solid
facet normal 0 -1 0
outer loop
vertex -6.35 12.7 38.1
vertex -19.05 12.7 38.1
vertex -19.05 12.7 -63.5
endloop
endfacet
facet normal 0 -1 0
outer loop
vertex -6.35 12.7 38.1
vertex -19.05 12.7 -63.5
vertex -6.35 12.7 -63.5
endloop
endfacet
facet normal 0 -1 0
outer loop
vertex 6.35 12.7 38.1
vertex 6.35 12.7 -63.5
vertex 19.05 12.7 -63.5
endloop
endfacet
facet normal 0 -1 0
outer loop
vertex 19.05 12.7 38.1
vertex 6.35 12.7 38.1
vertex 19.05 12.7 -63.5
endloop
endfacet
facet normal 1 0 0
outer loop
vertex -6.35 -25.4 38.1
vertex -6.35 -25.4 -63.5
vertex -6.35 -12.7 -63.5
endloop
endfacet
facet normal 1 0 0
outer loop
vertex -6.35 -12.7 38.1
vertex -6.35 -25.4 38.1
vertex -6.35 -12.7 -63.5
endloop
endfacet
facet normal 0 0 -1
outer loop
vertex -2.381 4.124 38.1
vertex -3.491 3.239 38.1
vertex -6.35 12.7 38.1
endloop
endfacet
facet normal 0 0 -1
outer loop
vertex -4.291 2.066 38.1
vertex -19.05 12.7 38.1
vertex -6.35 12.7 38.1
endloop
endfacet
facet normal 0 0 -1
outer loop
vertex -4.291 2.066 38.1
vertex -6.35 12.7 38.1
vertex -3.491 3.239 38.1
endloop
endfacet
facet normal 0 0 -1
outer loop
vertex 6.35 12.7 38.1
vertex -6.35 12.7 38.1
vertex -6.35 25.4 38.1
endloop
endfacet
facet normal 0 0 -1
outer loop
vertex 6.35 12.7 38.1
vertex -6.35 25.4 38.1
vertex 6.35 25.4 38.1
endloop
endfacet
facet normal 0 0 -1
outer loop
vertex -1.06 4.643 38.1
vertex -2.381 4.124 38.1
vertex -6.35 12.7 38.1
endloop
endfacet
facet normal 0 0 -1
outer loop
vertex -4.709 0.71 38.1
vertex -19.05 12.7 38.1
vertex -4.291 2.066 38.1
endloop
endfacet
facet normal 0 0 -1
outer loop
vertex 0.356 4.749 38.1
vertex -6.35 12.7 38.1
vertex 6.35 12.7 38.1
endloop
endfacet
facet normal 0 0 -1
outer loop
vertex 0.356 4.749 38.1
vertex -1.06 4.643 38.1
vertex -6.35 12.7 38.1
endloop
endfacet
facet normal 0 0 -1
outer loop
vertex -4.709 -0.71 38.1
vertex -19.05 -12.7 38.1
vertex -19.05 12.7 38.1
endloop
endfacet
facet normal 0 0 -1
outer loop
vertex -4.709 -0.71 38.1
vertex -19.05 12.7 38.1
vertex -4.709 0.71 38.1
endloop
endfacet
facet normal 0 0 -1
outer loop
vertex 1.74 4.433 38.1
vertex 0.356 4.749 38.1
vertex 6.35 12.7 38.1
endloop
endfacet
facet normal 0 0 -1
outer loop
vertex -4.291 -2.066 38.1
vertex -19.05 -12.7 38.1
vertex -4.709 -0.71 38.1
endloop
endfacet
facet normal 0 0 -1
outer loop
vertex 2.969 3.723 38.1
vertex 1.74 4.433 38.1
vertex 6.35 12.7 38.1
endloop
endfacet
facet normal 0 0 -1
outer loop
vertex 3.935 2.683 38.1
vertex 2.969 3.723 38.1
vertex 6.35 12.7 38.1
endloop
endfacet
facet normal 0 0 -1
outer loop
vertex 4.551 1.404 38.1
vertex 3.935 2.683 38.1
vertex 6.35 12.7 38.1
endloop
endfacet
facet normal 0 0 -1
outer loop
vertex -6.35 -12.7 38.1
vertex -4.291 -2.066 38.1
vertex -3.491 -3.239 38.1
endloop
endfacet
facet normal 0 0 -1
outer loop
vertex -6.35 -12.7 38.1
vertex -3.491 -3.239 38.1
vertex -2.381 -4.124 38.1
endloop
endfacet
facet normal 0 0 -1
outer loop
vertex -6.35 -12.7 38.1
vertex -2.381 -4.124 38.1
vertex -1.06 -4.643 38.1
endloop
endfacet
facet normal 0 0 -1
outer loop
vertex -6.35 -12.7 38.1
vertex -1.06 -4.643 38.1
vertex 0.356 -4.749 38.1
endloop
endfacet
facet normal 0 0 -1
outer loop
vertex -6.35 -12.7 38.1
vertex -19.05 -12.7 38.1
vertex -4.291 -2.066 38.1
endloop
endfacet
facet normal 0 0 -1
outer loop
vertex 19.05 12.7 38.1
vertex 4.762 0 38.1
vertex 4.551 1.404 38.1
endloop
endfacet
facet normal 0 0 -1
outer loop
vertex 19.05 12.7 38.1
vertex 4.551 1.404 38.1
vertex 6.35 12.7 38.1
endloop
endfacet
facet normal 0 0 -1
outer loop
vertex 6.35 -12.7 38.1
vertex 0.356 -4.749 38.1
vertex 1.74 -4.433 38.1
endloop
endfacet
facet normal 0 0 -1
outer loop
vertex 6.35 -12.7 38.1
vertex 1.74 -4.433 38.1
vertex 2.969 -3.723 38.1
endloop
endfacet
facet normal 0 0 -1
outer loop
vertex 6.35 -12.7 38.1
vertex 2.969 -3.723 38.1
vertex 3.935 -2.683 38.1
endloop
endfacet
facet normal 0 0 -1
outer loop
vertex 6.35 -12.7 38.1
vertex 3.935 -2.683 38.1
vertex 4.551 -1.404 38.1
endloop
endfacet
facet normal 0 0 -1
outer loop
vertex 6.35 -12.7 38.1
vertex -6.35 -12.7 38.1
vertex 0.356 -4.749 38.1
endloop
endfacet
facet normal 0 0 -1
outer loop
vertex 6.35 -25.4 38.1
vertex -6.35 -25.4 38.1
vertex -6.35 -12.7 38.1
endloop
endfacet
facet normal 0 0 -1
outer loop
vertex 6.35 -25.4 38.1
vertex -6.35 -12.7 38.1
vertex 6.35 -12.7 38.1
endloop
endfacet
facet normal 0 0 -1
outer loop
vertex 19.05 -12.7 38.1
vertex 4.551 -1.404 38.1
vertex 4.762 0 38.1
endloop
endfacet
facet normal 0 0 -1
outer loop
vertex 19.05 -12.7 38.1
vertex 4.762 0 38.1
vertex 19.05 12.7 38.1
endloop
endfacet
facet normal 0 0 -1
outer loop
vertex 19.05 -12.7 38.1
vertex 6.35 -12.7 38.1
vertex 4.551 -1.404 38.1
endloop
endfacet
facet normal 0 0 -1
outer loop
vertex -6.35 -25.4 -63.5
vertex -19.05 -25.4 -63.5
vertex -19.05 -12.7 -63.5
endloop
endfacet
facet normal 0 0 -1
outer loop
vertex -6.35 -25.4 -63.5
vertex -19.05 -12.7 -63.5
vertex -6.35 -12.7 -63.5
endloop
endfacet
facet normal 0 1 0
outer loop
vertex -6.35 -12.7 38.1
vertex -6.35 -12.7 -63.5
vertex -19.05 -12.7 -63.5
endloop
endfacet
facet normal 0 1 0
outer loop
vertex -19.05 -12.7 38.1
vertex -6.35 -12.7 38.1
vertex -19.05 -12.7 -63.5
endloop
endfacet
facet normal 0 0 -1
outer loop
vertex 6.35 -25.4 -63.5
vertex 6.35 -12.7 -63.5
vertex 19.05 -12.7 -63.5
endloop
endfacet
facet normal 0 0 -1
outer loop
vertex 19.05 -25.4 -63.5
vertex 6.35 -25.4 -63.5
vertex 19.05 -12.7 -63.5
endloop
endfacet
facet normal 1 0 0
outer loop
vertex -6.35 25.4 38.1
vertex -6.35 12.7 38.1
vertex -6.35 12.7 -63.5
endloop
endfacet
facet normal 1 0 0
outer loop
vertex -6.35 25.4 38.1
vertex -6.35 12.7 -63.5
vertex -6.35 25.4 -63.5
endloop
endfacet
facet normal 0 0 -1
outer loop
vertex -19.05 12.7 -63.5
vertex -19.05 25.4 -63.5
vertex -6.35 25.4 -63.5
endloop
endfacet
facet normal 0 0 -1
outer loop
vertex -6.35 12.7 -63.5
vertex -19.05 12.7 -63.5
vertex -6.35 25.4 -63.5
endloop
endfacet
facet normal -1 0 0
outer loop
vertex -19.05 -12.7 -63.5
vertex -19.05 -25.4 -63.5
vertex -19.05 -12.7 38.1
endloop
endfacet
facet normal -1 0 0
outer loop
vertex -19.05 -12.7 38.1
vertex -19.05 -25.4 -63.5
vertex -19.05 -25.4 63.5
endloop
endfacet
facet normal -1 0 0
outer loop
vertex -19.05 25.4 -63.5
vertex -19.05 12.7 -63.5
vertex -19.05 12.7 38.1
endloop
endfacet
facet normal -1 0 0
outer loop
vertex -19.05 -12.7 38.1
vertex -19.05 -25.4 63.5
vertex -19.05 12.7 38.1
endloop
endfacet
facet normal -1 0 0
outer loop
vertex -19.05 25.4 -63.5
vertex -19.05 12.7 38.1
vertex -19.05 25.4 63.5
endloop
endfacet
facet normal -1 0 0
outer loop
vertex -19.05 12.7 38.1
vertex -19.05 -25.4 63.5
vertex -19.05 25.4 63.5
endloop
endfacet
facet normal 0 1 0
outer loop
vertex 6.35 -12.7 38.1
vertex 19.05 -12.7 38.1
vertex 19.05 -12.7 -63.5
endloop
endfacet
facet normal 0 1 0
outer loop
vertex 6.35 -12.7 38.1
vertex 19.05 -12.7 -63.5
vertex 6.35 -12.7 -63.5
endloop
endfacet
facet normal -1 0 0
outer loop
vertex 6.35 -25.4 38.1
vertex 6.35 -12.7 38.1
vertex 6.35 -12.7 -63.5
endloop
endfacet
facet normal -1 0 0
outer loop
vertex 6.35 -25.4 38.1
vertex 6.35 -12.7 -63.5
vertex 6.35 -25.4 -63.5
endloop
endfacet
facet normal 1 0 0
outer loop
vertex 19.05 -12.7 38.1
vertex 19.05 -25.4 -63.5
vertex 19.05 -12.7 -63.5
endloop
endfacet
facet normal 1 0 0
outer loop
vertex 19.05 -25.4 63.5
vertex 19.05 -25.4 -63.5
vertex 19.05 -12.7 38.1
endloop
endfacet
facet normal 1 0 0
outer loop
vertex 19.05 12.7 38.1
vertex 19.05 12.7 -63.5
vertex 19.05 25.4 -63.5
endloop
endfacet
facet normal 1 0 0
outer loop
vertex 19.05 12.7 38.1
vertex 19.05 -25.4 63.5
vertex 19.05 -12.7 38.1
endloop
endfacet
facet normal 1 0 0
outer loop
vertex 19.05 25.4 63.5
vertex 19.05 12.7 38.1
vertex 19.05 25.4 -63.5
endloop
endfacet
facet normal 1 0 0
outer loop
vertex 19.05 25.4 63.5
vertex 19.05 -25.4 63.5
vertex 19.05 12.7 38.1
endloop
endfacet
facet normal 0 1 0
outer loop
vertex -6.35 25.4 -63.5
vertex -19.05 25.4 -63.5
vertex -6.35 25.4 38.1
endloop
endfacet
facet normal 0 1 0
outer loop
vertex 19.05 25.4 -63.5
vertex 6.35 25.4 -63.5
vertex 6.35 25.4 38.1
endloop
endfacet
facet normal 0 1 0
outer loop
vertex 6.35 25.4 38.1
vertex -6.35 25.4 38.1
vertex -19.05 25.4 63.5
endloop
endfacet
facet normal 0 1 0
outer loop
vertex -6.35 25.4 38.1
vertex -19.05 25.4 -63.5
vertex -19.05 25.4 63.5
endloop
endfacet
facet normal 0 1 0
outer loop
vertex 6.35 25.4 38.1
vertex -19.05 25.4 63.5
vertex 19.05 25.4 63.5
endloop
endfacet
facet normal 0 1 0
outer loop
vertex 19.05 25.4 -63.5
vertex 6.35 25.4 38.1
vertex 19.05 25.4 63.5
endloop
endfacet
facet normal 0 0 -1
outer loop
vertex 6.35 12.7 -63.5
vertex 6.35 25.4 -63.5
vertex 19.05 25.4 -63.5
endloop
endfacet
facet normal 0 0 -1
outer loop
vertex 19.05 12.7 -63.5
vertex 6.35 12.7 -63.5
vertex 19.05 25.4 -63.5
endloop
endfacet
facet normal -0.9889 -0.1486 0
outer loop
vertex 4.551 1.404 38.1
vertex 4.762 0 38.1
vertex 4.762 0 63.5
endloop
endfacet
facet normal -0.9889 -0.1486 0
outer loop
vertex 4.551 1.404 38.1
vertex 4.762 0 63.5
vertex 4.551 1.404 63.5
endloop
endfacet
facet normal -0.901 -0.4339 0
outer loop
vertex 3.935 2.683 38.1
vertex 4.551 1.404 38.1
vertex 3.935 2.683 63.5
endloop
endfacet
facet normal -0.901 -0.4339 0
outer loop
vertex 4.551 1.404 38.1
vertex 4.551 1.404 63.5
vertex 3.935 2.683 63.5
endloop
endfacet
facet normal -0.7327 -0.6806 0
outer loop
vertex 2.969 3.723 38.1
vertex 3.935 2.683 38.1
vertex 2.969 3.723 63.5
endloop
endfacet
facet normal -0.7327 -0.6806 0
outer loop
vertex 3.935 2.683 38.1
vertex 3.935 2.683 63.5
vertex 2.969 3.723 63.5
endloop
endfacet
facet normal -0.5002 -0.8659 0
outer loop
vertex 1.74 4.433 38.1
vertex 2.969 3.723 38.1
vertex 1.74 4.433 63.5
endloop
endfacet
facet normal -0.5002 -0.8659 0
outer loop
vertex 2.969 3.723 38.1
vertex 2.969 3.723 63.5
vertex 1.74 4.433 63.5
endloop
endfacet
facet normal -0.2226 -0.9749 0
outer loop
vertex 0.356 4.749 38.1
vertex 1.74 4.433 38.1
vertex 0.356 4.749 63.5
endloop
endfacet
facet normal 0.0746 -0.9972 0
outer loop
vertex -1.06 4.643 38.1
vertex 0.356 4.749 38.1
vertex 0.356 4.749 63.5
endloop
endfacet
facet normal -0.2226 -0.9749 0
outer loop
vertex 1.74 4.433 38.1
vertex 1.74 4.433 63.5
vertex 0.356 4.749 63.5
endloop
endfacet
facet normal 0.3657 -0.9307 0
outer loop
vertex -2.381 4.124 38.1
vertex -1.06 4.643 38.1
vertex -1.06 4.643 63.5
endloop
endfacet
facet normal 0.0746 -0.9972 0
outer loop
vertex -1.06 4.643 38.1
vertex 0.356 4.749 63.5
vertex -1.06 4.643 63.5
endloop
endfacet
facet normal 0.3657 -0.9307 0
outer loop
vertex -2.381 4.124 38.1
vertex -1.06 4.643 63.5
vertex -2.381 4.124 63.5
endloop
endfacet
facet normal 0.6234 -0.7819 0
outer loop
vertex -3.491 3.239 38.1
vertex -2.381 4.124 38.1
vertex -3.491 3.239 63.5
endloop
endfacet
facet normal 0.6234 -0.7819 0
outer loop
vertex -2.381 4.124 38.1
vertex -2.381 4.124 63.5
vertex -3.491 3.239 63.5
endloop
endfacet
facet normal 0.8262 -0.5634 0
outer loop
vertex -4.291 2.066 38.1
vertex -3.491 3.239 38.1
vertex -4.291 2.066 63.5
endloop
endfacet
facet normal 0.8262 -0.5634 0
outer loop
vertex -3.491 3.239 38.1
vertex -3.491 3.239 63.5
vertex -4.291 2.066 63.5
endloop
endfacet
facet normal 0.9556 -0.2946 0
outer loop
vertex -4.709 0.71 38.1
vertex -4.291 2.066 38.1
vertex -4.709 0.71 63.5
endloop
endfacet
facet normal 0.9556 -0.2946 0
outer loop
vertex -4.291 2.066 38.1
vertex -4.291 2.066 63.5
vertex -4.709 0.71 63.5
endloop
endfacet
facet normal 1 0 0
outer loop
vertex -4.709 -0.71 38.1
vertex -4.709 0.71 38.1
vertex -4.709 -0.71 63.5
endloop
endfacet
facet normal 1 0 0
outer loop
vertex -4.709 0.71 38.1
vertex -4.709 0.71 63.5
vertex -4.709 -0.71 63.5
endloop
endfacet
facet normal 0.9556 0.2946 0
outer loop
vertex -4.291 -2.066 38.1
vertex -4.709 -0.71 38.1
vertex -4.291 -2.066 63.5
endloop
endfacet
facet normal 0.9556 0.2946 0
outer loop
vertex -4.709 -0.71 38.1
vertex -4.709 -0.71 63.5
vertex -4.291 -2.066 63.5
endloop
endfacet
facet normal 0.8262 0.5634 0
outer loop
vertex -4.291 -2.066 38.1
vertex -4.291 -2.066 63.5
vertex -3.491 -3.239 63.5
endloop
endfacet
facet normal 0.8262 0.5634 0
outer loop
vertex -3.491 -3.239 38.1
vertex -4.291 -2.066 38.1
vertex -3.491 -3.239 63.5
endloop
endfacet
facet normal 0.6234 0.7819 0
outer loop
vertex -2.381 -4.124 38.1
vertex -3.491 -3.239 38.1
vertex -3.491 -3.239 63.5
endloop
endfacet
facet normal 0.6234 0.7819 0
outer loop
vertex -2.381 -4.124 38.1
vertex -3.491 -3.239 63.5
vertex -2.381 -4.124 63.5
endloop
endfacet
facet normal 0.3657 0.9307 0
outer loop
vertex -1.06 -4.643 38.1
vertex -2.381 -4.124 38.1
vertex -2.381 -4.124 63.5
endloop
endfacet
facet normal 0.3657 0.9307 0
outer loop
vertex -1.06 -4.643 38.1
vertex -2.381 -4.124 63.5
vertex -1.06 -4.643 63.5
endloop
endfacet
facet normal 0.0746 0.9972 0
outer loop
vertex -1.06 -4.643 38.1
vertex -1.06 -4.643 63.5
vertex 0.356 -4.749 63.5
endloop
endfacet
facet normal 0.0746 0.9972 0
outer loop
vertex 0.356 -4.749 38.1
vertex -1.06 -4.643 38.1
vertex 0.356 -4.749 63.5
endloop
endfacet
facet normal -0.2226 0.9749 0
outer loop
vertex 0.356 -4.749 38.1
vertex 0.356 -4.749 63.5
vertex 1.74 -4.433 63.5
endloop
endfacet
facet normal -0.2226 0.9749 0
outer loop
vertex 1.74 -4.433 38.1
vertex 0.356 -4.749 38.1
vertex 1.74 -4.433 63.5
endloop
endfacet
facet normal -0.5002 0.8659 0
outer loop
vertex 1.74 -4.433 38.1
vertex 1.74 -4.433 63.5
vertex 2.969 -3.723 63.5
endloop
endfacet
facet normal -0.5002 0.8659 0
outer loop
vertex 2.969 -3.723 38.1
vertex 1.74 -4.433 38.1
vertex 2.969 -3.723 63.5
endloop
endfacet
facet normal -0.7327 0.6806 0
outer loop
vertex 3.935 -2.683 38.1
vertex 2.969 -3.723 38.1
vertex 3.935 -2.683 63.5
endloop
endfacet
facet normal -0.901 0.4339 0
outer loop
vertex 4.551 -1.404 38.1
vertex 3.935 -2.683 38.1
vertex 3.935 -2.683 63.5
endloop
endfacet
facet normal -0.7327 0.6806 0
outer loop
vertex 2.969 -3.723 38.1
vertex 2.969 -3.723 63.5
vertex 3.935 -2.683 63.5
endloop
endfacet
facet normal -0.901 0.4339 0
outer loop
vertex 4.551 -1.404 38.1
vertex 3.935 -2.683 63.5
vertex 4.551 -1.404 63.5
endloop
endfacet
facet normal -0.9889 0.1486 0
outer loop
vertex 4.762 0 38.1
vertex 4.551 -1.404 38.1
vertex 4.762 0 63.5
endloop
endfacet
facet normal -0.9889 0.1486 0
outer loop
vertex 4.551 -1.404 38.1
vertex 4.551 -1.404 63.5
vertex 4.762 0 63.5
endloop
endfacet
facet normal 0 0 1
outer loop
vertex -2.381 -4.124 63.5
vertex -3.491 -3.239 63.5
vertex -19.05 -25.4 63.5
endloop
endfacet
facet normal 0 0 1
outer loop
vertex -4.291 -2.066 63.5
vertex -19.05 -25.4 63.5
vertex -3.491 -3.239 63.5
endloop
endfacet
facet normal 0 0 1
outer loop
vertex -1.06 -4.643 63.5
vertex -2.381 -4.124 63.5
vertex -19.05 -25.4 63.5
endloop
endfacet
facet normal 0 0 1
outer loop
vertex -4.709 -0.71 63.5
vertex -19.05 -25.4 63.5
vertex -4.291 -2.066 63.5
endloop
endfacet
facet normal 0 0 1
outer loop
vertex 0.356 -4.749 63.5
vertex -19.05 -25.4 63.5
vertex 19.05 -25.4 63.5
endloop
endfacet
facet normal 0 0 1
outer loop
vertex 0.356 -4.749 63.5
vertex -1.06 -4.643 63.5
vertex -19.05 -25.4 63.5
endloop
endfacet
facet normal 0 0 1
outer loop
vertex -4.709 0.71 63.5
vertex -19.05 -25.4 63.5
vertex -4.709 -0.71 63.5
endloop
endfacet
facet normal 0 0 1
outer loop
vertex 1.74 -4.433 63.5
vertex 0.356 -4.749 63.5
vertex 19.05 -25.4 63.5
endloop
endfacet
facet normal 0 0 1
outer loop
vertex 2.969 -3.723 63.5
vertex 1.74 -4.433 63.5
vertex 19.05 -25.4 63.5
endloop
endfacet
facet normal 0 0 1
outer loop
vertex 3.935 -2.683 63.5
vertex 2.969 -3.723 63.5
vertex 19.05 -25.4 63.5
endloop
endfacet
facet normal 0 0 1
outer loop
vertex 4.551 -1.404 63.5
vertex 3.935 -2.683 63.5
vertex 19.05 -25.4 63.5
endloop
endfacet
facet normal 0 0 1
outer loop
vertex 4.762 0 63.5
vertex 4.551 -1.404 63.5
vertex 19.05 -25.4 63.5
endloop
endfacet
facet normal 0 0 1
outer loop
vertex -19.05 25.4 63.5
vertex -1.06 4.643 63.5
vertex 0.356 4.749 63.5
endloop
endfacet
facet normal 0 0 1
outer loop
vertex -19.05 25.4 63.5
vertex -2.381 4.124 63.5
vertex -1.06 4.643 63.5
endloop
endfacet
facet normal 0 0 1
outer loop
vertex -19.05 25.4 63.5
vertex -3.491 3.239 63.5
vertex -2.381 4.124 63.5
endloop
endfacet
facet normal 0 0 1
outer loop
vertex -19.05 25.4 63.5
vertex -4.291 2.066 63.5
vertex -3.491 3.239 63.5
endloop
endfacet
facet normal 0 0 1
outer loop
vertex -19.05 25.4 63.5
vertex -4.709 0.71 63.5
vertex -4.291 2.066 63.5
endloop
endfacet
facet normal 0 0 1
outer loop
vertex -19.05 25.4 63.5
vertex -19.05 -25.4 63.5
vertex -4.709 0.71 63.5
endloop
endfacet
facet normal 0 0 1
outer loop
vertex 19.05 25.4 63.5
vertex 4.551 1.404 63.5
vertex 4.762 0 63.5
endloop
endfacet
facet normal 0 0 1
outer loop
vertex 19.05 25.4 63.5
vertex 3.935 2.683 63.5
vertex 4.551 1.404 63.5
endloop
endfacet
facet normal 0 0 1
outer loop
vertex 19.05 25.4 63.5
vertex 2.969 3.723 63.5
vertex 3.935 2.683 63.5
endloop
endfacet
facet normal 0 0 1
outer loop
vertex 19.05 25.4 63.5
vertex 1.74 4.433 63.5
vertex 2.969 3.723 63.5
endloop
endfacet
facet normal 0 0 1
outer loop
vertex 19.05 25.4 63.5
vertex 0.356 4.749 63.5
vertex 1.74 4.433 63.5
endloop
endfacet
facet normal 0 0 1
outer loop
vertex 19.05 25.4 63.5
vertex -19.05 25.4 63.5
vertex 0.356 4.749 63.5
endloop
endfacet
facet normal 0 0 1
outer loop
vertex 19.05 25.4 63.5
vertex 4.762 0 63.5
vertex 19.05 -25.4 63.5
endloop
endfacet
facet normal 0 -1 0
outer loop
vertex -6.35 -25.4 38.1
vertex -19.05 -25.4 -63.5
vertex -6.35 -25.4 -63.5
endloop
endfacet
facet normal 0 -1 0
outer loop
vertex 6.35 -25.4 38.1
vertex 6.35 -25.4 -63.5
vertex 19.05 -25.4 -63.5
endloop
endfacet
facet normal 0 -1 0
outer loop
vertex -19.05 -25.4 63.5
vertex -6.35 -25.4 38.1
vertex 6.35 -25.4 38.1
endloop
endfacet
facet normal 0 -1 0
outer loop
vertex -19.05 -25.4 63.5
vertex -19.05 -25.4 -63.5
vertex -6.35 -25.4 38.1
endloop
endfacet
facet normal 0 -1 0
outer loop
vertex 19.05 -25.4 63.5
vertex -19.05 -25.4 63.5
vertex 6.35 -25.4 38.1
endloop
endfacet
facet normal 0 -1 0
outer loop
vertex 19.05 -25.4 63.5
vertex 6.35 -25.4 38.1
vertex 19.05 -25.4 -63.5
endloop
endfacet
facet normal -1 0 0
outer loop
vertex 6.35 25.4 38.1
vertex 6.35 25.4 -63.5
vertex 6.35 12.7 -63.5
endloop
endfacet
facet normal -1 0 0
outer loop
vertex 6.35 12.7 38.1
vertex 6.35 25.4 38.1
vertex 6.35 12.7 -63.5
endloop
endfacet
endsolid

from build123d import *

# Parameters (mm, degrees)
F0_W     = 38.1
F0_H     = 50.8
F1_DEPTH = 63.5
F3_DEPTH = 101.6
F4_R     = 4.7625
F5_DEPTH = 25.4


with BuildPart() as f1:
    # F0 (on Top) → F1 (new body, symmetric)
    with BuildSketch(Plane.XY):
        Rectangle(F0_W, F0_H)
    extrude(amount=F1_DEPTH, both=True)

    # F2 (on face) → F3 (cut)
    with BuildSketch(Plane(origin=(0, 0, -63.5), x_dir=(1, 0, 0), z_dir=(0, 0, -1))):
        Polygon((6.35, 25.4), (-6.35, 25.4), (-6.35, 12.7), (-19.05, 12.7), (-19.05, -12.7), (-6.35, -12.7), (-6.35, -25.4), (6.35, -25.4), (6.35, -12.7), (19.05, -12.7), (19.05, 12.7), (6.35, 12.7), align=None)
    extrude(amount=-F3_DEPTH, mode=Mode.SUBTRACT)

    # F4 (on face) → F5 (cut)
    with BuildSketch(Plane.XY.offset(63.5)):
        Circle(F4_R)
    extrude(amount=-F5_DEPTH, mode=Mode.SUBTRACT)


solid = f1.part
